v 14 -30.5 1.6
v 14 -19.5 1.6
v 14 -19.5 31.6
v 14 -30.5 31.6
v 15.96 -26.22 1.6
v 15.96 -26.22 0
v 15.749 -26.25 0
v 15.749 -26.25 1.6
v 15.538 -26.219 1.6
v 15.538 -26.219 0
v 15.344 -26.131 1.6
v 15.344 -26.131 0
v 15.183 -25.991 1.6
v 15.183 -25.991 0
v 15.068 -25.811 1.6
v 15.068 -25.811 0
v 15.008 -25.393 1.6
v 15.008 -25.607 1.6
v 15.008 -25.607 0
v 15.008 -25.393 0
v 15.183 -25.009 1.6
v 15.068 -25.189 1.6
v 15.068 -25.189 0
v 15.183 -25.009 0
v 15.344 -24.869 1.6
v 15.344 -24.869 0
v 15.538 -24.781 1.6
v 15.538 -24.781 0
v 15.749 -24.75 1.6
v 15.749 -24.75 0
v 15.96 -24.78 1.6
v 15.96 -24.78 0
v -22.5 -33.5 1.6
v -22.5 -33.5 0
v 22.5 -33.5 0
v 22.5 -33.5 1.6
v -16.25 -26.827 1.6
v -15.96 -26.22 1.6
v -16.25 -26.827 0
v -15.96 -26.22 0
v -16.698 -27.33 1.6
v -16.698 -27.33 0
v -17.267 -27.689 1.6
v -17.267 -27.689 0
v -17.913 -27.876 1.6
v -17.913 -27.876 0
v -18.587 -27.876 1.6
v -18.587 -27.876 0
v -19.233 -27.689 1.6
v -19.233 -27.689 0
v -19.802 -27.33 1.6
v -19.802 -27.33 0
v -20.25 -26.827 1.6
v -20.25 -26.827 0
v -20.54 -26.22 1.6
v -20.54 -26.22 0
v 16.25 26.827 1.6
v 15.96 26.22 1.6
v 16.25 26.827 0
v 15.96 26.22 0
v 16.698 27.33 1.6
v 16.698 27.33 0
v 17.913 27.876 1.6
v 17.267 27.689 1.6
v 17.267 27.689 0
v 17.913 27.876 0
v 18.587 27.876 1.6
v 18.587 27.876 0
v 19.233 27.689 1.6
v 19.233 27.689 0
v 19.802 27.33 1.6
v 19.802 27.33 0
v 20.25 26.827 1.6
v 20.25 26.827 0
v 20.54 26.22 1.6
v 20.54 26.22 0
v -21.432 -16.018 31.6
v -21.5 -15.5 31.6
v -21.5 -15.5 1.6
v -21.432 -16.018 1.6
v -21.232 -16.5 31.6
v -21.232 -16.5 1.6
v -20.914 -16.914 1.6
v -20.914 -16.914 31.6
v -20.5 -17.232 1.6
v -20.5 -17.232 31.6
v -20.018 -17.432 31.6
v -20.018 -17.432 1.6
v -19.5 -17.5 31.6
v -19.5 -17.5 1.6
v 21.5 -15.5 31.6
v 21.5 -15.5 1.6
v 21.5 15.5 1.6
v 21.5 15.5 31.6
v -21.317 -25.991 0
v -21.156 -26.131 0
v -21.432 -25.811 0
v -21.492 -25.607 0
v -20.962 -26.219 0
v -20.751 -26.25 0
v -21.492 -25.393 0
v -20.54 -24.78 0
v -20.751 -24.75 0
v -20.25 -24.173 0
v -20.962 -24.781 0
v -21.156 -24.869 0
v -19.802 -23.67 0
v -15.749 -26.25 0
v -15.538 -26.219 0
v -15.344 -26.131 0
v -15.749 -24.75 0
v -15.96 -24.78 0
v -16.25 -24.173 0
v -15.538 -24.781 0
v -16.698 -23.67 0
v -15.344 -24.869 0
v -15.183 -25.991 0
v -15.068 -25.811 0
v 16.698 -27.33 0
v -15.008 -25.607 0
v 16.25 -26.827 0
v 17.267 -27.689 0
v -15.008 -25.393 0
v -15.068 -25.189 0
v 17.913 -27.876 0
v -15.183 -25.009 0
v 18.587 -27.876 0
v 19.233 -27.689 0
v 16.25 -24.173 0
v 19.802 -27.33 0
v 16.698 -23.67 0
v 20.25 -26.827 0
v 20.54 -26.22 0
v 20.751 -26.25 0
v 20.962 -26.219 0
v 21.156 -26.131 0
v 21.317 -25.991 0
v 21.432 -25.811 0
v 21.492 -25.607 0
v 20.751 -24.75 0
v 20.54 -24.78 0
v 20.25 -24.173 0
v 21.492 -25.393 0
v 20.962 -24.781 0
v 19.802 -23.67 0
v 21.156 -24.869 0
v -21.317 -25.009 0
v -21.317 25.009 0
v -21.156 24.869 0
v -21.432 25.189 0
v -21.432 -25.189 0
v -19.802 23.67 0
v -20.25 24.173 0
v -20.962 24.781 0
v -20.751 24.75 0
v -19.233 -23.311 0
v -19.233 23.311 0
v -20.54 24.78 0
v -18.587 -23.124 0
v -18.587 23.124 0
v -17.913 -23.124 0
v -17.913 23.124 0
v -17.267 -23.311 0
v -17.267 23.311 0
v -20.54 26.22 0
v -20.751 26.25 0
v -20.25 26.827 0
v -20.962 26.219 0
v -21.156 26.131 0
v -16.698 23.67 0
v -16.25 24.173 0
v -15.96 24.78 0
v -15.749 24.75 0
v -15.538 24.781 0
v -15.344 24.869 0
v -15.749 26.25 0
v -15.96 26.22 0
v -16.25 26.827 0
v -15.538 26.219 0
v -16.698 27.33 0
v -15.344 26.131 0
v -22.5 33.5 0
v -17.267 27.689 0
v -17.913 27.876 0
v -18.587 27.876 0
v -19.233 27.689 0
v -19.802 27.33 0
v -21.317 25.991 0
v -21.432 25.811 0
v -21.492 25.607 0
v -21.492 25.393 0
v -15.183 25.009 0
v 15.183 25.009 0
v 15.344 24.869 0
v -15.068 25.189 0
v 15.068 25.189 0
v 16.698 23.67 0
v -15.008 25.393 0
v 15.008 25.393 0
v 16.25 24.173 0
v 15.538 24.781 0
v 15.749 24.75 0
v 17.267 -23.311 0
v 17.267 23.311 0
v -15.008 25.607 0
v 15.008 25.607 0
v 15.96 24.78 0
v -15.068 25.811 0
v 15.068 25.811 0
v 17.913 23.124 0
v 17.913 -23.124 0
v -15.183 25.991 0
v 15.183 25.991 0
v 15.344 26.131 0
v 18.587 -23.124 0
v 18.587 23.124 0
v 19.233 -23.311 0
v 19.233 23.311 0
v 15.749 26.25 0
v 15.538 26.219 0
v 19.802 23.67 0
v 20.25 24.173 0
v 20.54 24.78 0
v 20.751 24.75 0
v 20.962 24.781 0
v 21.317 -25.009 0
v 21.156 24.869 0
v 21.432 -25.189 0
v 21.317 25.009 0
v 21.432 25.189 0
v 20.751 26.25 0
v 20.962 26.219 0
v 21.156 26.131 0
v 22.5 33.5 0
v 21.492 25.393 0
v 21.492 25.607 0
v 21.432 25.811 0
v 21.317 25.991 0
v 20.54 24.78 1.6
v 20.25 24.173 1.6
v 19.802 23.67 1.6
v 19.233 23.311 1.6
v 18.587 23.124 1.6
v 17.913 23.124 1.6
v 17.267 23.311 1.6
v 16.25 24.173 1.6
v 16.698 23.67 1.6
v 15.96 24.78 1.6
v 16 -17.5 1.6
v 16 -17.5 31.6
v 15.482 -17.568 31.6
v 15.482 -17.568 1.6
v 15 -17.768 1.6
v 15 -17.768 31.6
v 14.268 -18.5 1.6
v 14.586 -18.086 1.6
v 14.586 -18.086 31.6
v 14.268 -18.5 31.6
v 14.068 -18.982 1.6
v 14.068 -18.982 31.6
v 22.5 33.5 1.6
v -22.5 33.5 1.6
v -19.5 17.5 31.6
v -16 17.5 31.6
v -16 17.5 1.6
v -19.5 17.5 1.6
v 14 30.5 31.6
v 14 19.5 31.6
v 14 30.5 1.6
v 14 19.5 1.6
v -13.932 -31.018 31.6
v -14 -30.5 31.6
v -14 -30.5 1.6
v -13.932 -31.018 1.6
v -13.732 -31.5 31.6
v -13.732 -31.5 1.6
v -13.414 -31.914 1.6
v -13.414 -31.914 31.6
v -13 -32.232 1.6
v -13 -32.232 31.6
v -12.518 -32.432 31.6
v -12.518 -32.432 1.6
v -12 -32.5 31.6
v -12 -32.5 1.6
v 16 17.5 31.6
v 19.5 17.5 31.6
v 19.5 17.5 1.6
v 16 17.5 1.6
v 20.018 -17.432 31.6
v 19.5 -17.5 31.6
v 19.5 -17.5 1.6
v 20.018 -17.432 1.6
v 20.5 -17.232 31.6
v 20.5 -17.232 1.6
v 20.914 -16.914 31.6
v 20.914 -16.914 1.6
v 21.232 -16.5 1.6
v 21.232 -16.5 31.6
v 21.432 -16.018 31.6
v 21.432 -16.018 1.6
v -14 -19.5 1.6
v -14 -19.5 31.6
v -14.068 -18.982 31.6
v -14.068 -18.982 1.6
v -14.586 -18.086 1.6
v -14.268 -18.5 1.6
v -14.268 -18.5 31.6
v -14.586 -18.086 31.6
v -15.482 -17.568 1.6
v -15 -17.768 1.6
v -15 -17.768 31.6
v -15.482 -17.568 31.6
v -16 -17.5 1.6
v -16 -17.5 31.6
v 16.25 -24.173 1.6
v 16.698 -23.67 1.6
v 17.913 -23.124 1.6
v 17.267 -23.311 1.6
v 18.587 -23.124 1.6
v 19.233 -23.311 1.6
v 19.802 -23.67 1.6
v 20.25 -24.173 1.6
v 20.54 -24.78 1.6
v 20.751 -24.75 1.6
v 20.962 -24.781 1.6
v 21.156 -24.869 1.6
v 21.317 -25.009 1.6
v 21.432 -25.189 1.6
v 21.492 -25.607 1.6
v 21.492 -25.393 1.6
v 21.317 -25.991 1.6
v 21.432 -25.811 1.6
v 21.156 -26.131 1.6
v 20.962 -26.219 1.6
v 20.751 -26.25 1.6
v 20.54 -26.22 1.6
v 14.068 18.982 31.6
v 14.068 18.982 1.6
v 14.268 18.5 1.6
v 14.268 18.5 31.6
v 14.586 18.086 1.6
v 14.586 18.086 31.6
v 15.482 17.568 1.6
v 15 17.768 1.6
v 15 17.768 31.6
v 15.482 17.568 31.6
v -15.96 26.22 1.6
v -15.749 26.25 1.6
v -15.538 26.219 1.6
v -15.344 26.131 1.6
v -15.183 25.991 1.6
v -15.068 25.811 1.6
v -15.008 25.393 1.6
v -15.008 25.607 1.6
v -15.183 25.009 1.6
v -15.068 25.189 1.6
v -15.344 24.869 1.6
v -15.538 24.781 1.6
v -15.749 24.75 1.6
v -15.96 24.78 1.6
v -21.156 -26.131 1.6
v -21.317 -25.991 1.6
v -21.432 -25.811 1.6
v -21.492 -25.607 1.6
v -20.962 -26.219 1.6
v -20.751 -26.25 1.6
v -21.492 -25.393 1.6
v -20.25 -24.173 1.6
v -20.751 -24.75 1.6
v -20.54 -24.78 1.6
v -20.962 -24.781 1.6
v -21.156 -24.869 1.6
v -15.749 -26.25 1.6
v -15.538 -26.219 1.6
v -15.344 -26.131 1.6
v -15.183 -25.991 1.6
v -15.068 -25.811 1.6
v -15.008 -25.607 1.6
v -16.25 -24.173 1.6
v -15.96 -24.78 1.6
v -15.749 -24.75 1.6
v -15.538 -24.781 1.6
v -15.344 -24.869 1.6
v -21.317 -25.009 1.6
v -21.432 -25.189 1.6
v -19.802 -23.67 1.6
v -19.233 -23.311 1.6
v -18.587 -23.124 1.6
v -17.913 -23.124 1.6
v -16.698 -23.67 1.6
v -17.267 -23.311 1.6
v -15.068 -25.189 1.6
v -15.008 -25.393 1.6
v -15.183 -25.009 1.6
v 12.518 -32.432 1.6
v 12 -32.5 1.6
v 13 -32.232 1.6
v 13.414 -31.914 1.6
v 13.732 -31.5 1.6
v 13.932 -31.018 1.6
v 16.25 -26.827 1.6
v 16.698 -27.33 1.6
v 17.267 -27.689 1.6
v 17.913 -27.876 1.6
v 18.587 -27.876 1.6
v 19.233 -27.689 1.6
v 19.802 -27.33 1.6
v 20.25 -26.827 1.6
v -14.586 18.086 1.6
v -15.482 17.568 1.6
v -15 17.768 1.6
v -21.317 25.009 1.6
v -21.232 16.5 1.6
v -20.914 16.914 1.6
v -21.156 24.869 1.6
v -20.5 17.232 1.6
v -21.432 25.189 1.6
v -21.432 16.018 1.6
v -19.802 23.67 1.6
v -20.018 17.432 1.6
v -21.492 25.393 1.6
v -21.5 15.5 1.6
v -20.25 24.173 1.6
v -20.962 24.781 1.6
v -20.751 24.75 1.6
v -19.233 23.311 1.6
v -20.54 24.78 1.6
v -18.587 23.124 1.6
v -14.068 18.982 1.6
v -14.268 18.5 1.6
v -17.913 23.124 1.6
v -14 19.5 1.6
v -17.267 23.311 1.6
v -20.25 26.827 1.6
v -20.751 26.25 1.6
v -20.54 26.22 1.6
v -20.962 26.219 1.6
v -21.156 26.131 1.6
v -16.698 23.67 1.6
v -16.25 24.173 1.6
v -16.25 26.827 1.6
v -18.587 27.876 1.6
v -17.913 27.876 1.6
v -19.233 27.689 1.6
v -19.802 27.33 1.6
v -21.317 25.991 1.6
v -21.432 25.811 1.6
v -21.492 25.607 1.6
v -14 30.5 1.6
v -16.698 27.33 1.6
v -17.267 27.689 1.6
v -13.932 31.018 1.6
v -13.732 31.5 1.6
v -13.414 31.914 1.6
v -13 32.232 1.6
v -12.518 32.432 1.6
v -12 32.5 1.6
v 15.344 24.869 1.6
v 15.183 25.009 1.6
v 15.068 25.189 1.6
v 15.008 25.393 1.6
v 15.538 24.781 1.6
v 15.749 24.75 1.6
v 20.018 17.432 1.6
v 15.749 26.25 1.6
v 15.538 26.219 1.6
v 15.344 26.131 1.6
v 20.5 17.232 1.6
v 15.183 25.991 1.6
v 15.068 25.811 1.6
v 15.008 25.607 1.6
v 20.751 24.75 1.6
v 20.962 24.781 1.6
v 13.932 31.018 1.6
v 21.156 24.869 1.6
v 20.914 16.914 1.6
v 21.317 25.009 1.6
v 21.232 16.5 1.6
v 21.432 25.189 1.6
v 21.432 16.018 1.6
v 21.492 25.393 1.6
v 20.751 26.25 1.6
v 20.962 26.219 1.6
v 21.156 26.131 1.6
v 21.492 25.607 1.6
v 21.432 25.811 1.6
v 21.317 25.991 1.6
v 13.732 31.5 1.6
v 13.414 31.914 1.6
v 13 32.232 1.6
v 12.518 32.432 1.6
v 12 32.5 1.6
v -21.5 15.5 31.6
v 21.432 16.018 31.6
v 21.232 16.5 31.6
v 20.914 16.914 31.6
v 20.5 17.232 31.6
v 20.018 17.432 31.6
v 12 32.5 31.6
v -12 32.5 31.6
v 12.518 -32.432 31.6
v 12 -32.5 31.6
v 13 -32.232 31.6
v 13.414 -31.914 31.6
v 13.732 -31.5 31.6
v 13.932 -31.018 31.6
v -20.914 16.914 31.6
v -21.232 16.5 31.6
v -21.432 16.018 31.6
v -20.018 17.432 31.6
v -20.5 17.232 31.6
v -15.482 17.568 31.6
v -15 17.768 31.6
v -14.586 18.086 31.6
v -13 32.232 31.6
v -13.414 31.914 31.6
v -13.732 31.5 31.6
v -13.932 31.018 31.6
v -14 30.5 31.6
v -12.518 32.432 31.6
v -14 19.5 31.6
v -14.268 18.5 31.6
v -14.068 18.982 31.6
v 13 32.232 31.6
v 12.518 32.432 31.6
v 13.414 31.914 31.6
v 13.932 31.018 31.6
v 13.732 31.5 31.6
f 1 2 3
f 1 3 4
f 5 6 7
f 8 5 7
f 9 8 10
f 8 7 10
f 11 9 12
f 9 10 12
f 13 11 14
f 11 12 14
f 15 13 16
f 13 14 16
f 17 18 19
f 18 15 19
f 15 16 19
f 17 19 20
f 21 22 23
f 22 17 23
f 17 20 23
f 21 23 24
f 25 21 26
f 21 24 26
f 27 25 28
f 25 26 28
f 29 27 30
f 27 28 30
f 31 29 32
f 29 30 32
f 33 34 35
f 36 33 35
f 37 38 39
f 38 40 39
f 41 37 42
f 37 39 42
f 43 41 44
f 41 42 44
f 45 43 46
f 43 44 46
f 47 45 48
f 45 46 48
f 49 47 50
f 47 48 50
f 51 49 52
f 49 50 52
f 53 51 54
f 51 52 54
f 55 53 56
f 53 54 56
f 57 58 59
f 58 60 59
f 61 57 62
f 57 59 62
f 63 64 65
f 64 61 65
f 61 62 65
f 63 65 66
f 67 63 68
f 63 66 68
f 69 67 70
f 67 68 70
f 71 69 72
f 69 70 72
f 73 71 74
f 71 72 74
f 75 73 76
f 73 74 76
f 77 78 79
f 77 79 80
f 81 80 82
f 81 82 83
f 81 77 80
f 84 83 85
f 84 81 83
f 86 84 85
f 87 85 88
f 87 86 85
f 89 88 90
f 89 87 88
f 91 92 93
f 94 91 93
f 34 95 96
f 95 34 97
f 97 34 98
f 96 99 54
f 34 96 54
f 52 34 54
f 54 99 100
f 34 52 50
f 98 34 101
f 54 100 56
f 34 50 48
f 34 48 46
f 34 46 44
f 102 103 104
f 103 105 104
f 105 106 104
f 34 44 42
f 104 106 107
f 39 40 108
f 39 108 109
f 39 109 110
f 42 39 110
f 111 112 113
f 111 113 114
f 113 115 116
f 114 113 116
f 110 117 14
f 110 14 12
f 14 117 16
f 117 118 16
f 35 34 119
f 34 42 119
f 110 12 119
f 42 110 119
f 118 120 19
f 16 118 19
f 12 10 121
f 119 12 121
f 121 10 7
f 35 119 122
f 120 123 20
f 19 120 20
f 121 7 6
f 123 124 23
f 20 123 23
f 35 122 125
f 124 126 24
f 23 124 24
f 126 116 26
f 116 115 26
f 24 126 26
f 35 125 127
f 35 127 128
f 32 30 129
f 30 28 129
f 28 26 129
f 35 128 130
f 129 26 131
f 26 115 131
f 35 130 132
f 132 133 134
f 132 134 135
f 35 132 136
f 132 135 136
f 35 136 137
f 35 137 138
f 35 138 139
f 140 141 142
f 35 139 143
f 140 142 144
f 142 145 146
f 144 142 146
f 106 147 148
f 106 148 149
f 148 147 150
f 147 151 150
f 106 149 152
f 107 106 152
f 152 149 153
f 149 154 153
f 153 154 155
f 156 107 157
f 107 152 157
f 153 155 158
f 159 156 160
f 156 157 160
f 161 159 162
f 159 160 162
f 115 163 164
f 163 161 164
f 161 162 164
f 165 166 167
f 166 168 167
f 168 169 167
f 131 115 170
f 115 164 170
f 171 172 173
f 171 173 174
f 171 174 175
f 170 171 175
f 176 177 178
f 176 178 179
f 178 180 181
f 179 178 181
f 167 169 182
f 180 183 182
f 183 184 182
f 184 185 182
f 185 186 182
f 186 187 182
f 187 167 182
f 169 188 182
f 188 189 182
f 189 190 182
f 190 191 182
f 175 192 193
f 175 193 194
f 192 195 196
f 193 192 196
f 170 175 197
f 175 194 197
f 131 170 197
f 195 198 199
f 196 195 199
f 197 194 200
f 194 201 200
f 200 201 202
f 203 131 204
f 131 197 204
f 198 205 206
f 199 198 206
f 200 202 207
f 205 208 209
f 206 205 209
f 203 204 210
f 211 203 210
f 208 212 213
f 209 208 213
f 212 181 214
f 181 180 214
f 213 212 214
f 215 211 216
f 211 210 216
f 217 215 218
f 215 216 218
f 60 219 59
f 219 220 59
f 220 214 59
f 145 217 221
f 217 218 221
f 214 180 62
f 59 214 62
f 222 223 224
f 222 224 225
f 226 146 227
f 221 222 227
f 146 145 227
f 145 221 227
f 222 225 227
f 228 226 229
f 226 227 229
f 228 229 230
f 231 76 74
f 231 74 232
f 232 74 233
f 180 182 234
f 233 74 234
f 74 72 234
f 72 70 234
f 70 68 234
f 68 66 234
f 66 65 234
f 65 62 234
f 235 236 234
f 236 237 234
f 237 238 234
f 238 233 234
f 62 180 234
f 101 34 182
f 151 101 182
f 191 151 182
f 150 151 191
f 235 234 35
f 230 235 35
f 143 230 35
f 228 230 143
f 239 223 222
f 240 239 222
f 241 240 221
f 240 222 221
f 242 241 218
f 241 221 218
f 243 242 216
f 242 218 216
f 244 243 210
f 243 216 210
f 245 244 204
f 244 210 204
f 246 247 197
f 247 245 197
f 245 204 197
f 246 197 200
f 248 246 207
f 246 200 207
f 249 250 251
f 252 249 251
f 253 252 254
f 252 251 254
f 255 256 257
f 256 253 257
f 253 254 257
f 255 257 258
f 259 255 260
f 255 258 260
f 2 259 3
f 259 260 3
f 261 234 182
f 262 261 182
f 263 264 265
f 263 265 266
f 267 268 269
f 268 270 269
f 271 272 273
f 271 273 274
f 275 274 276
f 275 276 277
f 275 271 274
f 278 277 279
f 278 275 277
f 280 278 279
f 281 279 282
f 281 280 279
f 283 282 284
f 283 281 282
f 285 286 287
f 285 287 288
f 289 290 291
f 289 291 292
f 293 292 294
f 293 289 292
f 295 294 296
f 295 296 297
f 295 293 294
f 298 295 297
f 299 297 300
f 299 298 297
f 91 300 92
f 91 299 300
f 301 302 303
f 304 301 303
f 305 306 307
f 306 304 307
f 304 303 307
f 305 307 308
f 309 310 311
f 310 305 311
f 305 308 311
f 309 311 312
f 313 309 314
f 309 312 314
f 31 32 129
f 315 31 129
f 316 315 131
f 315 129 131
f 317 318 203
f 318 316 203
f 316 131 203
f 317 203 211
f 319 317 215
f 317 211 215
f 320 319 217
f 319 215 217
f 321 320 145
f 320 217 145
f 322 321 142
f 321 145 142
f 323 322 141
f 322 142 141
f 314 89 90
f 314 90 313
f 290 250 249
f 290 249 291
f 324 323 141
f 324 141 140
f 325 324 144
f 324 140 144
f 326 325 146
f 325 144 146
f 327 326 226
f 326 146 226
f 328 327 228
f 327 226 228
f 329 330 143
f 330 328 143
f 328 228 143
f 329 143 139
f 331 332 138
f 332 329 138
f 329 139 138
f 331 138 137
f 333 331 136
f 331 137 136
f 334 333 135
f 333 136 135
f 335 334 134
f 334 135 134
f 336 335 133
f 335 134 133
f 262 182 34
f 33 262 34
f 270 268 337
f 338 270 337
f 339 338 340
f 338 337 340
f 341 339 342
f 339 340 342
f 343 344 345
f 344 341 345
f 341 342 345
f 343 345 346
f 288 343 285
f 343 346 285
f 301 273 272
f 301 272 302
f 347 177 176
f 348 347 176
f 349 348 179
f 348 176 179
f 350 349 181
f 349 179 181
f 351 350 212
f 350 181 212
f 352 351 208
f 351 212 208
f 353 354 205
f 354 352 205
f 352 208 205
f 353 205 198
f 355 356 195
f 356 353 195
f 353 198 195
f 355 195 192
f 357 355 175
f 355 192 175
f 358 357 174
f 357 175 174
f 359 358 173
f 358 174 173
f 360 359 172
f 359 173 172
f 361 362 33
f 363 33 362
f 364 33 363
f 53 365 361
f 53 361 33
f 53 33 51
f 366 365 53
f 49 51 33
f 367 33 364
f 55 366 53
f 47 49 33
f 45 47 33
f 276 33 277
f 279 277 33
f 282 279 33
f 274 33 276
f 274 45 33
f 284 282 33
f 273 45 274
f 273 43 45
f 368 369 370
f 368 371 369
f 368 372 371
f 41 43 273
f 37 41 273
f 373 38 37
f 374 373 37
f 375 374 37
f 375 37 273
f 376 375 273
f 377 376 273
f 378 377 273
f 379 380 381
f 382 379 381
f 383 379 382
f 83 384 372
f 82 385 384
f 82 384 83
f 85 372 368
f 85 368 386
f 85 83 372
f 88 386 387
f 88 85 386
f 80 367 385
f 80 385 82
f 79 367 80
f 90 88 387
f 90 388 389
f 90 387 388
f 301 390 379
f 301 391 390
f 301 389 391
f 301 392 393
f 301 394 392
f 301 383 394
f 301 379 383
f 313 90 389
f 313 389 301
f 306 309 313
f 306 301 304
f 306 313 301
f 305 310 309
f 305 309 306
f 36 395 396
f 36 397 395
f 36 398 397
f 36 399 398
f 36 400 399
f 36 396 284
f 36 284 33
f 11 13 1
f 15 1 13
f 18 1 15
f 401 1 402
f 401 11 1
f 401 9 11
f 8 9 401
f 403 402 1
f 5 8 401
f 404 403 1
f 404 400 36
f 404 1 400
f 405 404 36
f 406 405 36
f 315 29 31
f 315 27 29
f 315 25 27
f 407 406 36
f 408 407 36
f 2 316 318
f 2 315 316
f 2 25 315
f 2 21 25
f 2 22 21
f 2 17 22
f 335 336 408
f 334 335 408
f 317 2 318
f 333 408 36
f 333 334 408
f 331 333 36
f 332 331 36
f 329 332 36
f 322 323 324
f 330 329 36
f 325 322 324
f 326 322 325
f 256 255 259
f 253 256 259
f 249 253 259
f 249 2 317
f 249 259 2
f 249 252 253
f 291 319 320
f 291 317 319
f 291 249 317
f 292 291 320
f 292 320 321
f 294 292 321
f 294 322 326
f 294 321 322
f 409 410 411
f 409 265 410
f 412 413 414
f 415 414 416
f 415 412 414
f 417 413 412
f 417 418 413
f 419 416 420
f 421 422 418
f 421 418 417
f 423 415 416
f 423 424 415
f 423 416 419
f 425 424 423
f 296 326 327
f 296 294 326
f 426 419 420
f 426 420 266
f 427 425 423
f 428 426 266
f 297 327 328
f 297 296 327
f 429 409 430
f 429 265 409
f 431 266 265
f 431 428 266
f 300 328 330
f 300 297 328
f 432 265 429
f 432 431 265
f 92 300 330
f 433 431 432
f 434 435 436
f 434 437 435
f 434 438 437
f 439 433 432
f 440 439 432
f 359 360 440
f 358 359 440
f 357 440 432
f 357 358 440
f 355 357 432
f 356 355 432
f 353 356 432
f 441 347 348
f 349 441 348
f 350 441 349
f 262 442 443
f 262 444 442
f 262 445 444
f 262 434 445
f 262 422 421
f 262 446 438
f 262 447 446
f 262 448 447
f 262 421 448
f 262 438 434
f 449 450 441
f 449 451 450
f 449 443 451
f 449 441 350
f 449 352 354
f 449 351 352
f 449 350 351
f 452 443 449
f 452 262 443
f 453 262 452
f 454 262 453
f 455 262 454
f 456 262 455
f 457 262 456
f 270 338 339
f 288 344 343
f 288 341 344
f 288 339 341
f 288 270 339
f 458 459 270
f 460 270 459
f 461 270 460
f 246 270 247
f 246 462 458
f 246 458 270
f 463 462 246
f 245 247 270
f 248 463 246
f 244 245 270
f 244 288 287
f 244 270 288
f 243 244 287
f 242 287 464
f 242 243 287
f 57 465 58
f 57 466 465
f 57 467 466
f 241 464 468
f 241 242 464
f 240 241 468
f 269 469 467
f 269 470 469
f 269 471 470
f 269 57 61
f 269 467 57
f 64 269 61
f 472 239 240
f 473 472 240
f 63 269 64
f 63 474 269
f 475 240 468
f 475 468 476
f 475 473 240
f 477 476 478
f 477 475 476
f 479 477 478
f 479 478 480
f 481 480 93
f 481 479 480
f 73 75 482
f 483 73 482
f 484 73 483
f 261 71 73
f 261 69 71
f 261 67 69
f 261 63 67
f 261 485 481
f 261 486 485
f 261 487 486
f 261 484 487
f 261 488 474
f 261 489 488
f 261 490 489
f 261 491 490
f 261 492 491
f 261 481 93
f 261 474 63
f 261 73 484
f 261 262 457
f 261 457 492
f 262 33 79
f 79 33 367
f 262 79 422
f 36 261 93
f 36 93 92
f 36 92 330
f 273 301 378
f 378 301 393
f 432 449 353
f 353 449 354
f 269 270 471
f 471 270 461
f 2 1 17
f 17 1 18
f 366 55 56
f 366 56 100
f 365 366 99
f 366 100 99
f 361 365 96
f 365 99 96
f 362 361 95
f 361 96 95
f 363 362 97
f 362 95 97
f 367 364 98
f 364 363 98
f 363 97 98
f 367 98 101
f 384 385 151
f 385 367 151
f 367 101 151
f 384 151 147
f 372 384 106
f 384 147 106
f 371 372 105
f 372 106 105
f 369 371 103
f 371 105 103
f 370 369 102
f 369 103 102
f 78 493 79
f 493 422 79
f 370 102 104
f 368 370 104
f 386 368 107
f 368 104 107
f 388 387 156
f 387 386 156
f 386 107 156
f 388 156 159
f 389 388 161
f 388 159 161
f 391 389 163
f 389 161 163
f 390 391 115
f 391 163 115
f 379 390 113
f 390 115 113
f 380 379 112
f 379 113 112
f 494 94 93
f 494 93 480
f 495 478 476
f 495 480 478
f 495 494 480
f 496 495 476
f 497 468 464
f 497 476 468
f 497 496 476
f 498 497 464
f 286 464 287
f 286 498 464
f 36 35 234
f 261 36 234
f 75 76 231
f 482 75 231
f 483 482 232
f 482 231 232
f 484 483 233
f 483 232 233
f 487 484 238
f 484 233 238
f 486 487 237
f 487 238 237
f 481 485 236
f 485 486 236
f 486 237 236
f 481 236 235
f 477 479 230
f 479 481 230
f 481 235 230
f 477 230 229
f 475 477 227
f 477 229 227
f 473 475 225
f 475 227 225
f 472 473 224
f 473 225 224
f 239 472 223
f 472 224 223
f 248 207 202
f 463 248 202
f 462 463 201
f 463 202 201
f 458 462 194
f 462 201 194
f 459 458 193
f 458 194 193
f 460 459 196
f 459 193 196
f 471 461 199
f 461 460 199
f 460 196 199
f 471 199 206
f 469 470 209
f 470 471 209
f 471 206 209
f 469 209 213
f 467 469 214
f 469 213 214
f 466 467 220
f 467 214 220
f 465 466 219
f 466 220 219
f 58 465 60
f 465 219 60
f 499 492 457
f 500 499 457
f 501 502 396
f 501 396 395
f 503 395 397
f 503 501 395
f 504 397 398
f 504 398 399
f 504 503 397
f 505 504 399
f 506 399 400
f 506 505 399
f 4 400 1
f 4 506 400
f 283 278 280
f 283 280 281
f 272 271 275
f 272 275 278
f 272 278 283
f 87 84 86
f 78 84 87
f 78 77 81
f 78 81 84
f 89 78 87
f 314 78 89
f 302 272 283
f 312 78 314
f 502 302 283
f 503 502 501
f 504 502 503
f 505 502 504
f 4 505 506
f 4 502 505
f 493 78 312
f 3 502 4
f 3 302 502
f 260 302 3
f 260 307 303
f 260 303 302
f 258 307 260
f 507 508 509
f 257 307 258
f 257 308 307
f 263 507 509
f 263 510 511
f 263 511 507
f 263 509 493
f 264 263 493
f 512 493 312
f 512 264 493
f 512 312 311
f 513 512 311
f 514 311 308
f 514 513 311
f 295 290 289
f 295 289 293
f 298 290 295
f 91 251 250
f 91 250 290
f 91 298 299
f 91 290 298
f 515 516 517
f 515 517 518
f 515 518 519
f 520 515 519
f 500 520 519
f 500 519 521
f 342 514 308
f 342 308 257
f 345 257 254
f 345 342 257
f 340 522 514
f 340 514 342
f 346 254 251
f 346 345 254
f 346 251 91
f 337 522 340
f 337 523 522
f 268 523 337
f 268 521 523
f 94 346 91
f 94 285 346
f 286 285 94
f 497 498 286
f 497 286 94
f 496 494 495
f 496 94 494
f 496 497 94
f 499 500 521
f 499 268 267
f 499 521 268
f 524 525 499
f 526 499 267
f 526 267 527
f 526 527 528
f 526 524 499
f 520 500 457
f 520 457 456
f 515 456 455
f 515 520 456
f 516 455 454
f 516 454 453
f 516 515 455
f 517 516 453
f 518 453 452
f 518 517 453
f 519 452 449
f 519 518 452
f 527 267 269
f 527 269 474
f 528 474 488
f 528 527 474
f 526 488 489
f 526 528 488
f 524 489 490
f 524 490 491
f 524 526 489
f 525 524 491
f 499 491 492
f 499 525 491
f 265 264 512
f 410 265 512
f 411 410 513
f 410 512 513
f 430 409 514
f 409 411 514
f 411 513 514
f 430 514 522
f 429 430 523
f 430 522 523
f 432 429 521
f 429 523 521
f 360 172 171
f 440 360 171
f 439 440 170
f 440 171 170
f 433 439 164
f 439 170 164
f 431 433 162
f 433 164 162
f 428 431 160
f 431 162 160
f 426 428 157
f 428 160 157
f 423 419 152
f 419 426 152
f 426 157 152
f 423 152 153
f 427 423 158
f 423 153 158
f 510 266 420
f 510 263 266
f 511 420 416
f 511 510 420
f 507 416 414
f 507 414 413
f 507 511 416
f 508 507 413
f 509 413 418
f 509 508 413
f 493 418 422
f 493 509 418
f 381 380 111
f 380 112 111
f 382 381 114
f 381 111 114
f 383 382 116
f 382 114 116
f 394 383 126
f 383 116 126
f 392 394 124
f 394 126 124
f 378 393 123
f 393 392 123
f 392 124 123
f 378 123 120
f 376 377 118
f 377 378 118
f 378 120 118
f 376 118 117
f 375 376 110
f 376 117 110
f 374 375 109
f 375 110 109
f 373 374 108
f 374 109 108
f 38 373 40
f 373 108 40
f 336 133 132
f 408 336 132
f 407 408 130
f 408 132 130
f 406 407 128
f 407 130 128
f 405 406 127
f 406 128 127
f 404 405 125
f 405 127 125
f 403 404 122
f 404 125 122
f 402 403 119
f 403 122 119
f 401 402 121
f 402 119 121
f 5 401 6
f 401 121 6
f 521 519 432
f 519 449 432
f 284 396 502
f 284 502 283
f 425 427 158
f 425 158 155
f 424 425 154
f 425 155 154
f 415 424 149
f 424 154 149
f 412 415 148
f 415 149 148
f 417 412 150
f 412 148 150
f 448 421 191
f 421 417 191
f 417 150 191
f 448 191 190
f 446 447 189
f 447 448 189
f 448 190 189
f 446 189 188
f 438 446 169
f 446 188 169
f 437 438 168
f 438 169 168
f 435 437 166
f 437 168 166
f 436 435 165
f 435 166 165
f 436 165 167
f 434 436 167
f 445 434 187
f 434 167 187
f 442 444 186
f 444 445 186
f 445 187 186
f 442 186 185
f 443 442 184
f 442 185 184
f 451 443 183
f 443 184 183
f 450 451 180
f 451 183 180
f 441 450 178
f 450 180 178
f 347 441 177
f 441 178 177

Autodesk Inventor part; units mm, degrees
ref_plane "YZ Plane" through (0, 0, 0) normal (1, 0, 0) x (0, 1, 0)
ref_plane "XZ Plane" through (0, 0, 0) normal (0, 1, 0) x (-1, 0, 0)
ref_plane "XY Plane" through (0, 0, 0) normal (0, 0, 1) x (1, 0, 0)
sketch "Sketch1" plane through (0, 0, 0) normal (0, 0, 1) x (1, 0, 0)
  line L0 (22.5, 33.5) -> (-22.5, 33.5)
  line L1 (-22.5, 33.5) -> (-22.5, -33.5)
  line L2 (-22.5, -33.5) -> (22.5, -33.5)
  line L3 (22.5, -33.5) -> (22.5, 33.5)
  line L4 (22.5, 33.5) -> (-22.5, -33.5) construction
  line L5 (-22.5, 33.5) -> (22.5, -33.5) construction
  line L6 (-18.25, 25.5) -> (18.25, 25.5) construction
  line L7 (18.25, 25.5) -> (18.25, -25.5) construction
  line L8 (18.25, -25.5) -> (-18.25, -25.5) construction
  line L9 (-18.25, -25.5) -> (-18.25, 25.5) construction
  line L10 (-18.25, 25.5) -> (18.25, -25.5) construction
  line L11 (18.25, 25.5) -> (-18.25, -25.5) construction
  line L12 (22.5, 0) -> (-22.5, 0) construction
  line L13 (0, 33.5) -> (0, -33.5) construction
  circle A0 centre (18.25, 25.5) radius 2.4
  circle A1 centre (-18.25, 25.5) radius 2.4
  circle A2 centre (18.25, -25.5) radius 2.4
  circle A3 centre (-18.25, -25.5) radius 2.4
  line L14 (18.25, 32.5) -> (18.25, 18.5) construction
  line L15 (21.5, 17.5) -> (-21.5, 17.5)
  line L16 (-21.5, 17.5) -> (-21.5, -17.5)
  line L17 (-21.5, -17.5) -> (21.5, -17.5)
  line L18 (21.5, -17.5) -> (21.5, 17.5)
  line L19 (21.5, 17.5) -> (-21.5, -17.5) construction
  line L20 (-21.5, 17.5) -> (21.5, -17.5) construction
  line L21 (14, 17.5) -> (14, 32.5)
  line L22 (14, 32.5) -> (-14, 32.5)
  line L23 (-14, 32.5) -> (-14, 17.5)
  line L24 (14, -17.5) -> (14, -32.5)
  line L25 (14, -32.5) -> (-14, -32.5)
  line L26 (-14, -32.5) -> (-14, -17.5)
  arc A4 (15.9605, 26.2199) -> (15.9605, 24.7801) centre (15.75, 25.5) ccw
  arc A5 (20.5395, 24.7801) -> (20.5395, 26.2199) centre (20.75, 25.5) ccw
  arc A6 (15.9605, -24.7801) -> (15.9605, -26.2199) centre (15.75, -25.5) ccw
  arc A7 (20.5395, -26.2199) -> (20.5395, -24.7801) centre (20.75, -25.5) ccw
  arc A8 (-15.9605, 24.7801) -> (-15.9605, 26.2199) centre (-15.75, 25.5) ccw
  arc A9 (-20.5395, 26.2199) -> (-20.5395, 24.7801) centre (-20.75, 25.5) ccw
  arc A10 (-15.9605, -26.2199) -> (-15.9605, -24.7801) centre (-15.75, -25.5) ccw
  arc A11 (-20.5395, -24.7801) -> (-20.5395, -26.2199) centre (-20.75, -25.5) ccw
  point P0 (0, 0)
  point P1 (14, -17.5)
  point P2 (-14, -17.5)
  point P3 (21.5, 25.5)
  point P4 (15, 25.5)
  point P5 (20.5395, 26.2199)
  point P6 (20.5395, 24.7801)
  point P7 (20.5395, -24.7801)
  point P8 (20.5395, -26.2199)
  point P9 (15.9605, -26.2199)
  point P10 (15.9605, -24.7801)
  point P11 (-20.5395, -26.2199)
  point P12 (-20.5395, -24.7801)
  point P13 (-15.9605, -24.7801)
  point P14 (-15.9605, -26.2199)
  point P15 (-20.5395, 24.7801)
  point P16 (-20.5395, 26.2199)
  point P17 (-15.9605, 26.2199)
  point P18 (-15.9605, 24.7801)
  dimension "d0" = 45
  dimension "d1" = 67
  dimension "d19" = 4.8
  dimension "d33" = 51
  dimension "d34" = 36.5
  dimension "d38" = 1
  dimension "d43" = 1
  dimension "d44" = 1
  dimension "d46" = 6.5
  dimension "d47" = 1.5
  dimension "d48" = 1
  dimension "d50" = 16
extrude "Extrusion1" add sketch "Sketch1" along normal blind 1.6 contours L3 L2 L1 L0 | L18 L17 L16 L15 | L15 L23 L22 L21 | L24 L25 L26 L17
extrude "Extrusion2" add sketch "Sketch1" along normal blind 31.6 contours L18 L17 L16 L15 | L15 L23 L22 L21 | L24 L25 L26 L17
fillet "Fillet1" radius 2 12 edges at (21.5, -17.5, 16.6) (21.5, 17.5, 16.6) (-21.5, -17.5, 16.6) (-21.5, 17.5, 16.6) (14, 17.5, 16.6) (14, -17.5, 16.6) (14, -32.5, 16.6) (-14, -32.5, 16.6) (-14, -17.5, 16.6) (-14, 17.5, 16.6) (-14, 32.5, 16.6) (14, 32.5, 16.6)
properties part number "SUSTAINA-RS485-COMMUNICATION-BOARD" material "Acetal Resin, Black"
